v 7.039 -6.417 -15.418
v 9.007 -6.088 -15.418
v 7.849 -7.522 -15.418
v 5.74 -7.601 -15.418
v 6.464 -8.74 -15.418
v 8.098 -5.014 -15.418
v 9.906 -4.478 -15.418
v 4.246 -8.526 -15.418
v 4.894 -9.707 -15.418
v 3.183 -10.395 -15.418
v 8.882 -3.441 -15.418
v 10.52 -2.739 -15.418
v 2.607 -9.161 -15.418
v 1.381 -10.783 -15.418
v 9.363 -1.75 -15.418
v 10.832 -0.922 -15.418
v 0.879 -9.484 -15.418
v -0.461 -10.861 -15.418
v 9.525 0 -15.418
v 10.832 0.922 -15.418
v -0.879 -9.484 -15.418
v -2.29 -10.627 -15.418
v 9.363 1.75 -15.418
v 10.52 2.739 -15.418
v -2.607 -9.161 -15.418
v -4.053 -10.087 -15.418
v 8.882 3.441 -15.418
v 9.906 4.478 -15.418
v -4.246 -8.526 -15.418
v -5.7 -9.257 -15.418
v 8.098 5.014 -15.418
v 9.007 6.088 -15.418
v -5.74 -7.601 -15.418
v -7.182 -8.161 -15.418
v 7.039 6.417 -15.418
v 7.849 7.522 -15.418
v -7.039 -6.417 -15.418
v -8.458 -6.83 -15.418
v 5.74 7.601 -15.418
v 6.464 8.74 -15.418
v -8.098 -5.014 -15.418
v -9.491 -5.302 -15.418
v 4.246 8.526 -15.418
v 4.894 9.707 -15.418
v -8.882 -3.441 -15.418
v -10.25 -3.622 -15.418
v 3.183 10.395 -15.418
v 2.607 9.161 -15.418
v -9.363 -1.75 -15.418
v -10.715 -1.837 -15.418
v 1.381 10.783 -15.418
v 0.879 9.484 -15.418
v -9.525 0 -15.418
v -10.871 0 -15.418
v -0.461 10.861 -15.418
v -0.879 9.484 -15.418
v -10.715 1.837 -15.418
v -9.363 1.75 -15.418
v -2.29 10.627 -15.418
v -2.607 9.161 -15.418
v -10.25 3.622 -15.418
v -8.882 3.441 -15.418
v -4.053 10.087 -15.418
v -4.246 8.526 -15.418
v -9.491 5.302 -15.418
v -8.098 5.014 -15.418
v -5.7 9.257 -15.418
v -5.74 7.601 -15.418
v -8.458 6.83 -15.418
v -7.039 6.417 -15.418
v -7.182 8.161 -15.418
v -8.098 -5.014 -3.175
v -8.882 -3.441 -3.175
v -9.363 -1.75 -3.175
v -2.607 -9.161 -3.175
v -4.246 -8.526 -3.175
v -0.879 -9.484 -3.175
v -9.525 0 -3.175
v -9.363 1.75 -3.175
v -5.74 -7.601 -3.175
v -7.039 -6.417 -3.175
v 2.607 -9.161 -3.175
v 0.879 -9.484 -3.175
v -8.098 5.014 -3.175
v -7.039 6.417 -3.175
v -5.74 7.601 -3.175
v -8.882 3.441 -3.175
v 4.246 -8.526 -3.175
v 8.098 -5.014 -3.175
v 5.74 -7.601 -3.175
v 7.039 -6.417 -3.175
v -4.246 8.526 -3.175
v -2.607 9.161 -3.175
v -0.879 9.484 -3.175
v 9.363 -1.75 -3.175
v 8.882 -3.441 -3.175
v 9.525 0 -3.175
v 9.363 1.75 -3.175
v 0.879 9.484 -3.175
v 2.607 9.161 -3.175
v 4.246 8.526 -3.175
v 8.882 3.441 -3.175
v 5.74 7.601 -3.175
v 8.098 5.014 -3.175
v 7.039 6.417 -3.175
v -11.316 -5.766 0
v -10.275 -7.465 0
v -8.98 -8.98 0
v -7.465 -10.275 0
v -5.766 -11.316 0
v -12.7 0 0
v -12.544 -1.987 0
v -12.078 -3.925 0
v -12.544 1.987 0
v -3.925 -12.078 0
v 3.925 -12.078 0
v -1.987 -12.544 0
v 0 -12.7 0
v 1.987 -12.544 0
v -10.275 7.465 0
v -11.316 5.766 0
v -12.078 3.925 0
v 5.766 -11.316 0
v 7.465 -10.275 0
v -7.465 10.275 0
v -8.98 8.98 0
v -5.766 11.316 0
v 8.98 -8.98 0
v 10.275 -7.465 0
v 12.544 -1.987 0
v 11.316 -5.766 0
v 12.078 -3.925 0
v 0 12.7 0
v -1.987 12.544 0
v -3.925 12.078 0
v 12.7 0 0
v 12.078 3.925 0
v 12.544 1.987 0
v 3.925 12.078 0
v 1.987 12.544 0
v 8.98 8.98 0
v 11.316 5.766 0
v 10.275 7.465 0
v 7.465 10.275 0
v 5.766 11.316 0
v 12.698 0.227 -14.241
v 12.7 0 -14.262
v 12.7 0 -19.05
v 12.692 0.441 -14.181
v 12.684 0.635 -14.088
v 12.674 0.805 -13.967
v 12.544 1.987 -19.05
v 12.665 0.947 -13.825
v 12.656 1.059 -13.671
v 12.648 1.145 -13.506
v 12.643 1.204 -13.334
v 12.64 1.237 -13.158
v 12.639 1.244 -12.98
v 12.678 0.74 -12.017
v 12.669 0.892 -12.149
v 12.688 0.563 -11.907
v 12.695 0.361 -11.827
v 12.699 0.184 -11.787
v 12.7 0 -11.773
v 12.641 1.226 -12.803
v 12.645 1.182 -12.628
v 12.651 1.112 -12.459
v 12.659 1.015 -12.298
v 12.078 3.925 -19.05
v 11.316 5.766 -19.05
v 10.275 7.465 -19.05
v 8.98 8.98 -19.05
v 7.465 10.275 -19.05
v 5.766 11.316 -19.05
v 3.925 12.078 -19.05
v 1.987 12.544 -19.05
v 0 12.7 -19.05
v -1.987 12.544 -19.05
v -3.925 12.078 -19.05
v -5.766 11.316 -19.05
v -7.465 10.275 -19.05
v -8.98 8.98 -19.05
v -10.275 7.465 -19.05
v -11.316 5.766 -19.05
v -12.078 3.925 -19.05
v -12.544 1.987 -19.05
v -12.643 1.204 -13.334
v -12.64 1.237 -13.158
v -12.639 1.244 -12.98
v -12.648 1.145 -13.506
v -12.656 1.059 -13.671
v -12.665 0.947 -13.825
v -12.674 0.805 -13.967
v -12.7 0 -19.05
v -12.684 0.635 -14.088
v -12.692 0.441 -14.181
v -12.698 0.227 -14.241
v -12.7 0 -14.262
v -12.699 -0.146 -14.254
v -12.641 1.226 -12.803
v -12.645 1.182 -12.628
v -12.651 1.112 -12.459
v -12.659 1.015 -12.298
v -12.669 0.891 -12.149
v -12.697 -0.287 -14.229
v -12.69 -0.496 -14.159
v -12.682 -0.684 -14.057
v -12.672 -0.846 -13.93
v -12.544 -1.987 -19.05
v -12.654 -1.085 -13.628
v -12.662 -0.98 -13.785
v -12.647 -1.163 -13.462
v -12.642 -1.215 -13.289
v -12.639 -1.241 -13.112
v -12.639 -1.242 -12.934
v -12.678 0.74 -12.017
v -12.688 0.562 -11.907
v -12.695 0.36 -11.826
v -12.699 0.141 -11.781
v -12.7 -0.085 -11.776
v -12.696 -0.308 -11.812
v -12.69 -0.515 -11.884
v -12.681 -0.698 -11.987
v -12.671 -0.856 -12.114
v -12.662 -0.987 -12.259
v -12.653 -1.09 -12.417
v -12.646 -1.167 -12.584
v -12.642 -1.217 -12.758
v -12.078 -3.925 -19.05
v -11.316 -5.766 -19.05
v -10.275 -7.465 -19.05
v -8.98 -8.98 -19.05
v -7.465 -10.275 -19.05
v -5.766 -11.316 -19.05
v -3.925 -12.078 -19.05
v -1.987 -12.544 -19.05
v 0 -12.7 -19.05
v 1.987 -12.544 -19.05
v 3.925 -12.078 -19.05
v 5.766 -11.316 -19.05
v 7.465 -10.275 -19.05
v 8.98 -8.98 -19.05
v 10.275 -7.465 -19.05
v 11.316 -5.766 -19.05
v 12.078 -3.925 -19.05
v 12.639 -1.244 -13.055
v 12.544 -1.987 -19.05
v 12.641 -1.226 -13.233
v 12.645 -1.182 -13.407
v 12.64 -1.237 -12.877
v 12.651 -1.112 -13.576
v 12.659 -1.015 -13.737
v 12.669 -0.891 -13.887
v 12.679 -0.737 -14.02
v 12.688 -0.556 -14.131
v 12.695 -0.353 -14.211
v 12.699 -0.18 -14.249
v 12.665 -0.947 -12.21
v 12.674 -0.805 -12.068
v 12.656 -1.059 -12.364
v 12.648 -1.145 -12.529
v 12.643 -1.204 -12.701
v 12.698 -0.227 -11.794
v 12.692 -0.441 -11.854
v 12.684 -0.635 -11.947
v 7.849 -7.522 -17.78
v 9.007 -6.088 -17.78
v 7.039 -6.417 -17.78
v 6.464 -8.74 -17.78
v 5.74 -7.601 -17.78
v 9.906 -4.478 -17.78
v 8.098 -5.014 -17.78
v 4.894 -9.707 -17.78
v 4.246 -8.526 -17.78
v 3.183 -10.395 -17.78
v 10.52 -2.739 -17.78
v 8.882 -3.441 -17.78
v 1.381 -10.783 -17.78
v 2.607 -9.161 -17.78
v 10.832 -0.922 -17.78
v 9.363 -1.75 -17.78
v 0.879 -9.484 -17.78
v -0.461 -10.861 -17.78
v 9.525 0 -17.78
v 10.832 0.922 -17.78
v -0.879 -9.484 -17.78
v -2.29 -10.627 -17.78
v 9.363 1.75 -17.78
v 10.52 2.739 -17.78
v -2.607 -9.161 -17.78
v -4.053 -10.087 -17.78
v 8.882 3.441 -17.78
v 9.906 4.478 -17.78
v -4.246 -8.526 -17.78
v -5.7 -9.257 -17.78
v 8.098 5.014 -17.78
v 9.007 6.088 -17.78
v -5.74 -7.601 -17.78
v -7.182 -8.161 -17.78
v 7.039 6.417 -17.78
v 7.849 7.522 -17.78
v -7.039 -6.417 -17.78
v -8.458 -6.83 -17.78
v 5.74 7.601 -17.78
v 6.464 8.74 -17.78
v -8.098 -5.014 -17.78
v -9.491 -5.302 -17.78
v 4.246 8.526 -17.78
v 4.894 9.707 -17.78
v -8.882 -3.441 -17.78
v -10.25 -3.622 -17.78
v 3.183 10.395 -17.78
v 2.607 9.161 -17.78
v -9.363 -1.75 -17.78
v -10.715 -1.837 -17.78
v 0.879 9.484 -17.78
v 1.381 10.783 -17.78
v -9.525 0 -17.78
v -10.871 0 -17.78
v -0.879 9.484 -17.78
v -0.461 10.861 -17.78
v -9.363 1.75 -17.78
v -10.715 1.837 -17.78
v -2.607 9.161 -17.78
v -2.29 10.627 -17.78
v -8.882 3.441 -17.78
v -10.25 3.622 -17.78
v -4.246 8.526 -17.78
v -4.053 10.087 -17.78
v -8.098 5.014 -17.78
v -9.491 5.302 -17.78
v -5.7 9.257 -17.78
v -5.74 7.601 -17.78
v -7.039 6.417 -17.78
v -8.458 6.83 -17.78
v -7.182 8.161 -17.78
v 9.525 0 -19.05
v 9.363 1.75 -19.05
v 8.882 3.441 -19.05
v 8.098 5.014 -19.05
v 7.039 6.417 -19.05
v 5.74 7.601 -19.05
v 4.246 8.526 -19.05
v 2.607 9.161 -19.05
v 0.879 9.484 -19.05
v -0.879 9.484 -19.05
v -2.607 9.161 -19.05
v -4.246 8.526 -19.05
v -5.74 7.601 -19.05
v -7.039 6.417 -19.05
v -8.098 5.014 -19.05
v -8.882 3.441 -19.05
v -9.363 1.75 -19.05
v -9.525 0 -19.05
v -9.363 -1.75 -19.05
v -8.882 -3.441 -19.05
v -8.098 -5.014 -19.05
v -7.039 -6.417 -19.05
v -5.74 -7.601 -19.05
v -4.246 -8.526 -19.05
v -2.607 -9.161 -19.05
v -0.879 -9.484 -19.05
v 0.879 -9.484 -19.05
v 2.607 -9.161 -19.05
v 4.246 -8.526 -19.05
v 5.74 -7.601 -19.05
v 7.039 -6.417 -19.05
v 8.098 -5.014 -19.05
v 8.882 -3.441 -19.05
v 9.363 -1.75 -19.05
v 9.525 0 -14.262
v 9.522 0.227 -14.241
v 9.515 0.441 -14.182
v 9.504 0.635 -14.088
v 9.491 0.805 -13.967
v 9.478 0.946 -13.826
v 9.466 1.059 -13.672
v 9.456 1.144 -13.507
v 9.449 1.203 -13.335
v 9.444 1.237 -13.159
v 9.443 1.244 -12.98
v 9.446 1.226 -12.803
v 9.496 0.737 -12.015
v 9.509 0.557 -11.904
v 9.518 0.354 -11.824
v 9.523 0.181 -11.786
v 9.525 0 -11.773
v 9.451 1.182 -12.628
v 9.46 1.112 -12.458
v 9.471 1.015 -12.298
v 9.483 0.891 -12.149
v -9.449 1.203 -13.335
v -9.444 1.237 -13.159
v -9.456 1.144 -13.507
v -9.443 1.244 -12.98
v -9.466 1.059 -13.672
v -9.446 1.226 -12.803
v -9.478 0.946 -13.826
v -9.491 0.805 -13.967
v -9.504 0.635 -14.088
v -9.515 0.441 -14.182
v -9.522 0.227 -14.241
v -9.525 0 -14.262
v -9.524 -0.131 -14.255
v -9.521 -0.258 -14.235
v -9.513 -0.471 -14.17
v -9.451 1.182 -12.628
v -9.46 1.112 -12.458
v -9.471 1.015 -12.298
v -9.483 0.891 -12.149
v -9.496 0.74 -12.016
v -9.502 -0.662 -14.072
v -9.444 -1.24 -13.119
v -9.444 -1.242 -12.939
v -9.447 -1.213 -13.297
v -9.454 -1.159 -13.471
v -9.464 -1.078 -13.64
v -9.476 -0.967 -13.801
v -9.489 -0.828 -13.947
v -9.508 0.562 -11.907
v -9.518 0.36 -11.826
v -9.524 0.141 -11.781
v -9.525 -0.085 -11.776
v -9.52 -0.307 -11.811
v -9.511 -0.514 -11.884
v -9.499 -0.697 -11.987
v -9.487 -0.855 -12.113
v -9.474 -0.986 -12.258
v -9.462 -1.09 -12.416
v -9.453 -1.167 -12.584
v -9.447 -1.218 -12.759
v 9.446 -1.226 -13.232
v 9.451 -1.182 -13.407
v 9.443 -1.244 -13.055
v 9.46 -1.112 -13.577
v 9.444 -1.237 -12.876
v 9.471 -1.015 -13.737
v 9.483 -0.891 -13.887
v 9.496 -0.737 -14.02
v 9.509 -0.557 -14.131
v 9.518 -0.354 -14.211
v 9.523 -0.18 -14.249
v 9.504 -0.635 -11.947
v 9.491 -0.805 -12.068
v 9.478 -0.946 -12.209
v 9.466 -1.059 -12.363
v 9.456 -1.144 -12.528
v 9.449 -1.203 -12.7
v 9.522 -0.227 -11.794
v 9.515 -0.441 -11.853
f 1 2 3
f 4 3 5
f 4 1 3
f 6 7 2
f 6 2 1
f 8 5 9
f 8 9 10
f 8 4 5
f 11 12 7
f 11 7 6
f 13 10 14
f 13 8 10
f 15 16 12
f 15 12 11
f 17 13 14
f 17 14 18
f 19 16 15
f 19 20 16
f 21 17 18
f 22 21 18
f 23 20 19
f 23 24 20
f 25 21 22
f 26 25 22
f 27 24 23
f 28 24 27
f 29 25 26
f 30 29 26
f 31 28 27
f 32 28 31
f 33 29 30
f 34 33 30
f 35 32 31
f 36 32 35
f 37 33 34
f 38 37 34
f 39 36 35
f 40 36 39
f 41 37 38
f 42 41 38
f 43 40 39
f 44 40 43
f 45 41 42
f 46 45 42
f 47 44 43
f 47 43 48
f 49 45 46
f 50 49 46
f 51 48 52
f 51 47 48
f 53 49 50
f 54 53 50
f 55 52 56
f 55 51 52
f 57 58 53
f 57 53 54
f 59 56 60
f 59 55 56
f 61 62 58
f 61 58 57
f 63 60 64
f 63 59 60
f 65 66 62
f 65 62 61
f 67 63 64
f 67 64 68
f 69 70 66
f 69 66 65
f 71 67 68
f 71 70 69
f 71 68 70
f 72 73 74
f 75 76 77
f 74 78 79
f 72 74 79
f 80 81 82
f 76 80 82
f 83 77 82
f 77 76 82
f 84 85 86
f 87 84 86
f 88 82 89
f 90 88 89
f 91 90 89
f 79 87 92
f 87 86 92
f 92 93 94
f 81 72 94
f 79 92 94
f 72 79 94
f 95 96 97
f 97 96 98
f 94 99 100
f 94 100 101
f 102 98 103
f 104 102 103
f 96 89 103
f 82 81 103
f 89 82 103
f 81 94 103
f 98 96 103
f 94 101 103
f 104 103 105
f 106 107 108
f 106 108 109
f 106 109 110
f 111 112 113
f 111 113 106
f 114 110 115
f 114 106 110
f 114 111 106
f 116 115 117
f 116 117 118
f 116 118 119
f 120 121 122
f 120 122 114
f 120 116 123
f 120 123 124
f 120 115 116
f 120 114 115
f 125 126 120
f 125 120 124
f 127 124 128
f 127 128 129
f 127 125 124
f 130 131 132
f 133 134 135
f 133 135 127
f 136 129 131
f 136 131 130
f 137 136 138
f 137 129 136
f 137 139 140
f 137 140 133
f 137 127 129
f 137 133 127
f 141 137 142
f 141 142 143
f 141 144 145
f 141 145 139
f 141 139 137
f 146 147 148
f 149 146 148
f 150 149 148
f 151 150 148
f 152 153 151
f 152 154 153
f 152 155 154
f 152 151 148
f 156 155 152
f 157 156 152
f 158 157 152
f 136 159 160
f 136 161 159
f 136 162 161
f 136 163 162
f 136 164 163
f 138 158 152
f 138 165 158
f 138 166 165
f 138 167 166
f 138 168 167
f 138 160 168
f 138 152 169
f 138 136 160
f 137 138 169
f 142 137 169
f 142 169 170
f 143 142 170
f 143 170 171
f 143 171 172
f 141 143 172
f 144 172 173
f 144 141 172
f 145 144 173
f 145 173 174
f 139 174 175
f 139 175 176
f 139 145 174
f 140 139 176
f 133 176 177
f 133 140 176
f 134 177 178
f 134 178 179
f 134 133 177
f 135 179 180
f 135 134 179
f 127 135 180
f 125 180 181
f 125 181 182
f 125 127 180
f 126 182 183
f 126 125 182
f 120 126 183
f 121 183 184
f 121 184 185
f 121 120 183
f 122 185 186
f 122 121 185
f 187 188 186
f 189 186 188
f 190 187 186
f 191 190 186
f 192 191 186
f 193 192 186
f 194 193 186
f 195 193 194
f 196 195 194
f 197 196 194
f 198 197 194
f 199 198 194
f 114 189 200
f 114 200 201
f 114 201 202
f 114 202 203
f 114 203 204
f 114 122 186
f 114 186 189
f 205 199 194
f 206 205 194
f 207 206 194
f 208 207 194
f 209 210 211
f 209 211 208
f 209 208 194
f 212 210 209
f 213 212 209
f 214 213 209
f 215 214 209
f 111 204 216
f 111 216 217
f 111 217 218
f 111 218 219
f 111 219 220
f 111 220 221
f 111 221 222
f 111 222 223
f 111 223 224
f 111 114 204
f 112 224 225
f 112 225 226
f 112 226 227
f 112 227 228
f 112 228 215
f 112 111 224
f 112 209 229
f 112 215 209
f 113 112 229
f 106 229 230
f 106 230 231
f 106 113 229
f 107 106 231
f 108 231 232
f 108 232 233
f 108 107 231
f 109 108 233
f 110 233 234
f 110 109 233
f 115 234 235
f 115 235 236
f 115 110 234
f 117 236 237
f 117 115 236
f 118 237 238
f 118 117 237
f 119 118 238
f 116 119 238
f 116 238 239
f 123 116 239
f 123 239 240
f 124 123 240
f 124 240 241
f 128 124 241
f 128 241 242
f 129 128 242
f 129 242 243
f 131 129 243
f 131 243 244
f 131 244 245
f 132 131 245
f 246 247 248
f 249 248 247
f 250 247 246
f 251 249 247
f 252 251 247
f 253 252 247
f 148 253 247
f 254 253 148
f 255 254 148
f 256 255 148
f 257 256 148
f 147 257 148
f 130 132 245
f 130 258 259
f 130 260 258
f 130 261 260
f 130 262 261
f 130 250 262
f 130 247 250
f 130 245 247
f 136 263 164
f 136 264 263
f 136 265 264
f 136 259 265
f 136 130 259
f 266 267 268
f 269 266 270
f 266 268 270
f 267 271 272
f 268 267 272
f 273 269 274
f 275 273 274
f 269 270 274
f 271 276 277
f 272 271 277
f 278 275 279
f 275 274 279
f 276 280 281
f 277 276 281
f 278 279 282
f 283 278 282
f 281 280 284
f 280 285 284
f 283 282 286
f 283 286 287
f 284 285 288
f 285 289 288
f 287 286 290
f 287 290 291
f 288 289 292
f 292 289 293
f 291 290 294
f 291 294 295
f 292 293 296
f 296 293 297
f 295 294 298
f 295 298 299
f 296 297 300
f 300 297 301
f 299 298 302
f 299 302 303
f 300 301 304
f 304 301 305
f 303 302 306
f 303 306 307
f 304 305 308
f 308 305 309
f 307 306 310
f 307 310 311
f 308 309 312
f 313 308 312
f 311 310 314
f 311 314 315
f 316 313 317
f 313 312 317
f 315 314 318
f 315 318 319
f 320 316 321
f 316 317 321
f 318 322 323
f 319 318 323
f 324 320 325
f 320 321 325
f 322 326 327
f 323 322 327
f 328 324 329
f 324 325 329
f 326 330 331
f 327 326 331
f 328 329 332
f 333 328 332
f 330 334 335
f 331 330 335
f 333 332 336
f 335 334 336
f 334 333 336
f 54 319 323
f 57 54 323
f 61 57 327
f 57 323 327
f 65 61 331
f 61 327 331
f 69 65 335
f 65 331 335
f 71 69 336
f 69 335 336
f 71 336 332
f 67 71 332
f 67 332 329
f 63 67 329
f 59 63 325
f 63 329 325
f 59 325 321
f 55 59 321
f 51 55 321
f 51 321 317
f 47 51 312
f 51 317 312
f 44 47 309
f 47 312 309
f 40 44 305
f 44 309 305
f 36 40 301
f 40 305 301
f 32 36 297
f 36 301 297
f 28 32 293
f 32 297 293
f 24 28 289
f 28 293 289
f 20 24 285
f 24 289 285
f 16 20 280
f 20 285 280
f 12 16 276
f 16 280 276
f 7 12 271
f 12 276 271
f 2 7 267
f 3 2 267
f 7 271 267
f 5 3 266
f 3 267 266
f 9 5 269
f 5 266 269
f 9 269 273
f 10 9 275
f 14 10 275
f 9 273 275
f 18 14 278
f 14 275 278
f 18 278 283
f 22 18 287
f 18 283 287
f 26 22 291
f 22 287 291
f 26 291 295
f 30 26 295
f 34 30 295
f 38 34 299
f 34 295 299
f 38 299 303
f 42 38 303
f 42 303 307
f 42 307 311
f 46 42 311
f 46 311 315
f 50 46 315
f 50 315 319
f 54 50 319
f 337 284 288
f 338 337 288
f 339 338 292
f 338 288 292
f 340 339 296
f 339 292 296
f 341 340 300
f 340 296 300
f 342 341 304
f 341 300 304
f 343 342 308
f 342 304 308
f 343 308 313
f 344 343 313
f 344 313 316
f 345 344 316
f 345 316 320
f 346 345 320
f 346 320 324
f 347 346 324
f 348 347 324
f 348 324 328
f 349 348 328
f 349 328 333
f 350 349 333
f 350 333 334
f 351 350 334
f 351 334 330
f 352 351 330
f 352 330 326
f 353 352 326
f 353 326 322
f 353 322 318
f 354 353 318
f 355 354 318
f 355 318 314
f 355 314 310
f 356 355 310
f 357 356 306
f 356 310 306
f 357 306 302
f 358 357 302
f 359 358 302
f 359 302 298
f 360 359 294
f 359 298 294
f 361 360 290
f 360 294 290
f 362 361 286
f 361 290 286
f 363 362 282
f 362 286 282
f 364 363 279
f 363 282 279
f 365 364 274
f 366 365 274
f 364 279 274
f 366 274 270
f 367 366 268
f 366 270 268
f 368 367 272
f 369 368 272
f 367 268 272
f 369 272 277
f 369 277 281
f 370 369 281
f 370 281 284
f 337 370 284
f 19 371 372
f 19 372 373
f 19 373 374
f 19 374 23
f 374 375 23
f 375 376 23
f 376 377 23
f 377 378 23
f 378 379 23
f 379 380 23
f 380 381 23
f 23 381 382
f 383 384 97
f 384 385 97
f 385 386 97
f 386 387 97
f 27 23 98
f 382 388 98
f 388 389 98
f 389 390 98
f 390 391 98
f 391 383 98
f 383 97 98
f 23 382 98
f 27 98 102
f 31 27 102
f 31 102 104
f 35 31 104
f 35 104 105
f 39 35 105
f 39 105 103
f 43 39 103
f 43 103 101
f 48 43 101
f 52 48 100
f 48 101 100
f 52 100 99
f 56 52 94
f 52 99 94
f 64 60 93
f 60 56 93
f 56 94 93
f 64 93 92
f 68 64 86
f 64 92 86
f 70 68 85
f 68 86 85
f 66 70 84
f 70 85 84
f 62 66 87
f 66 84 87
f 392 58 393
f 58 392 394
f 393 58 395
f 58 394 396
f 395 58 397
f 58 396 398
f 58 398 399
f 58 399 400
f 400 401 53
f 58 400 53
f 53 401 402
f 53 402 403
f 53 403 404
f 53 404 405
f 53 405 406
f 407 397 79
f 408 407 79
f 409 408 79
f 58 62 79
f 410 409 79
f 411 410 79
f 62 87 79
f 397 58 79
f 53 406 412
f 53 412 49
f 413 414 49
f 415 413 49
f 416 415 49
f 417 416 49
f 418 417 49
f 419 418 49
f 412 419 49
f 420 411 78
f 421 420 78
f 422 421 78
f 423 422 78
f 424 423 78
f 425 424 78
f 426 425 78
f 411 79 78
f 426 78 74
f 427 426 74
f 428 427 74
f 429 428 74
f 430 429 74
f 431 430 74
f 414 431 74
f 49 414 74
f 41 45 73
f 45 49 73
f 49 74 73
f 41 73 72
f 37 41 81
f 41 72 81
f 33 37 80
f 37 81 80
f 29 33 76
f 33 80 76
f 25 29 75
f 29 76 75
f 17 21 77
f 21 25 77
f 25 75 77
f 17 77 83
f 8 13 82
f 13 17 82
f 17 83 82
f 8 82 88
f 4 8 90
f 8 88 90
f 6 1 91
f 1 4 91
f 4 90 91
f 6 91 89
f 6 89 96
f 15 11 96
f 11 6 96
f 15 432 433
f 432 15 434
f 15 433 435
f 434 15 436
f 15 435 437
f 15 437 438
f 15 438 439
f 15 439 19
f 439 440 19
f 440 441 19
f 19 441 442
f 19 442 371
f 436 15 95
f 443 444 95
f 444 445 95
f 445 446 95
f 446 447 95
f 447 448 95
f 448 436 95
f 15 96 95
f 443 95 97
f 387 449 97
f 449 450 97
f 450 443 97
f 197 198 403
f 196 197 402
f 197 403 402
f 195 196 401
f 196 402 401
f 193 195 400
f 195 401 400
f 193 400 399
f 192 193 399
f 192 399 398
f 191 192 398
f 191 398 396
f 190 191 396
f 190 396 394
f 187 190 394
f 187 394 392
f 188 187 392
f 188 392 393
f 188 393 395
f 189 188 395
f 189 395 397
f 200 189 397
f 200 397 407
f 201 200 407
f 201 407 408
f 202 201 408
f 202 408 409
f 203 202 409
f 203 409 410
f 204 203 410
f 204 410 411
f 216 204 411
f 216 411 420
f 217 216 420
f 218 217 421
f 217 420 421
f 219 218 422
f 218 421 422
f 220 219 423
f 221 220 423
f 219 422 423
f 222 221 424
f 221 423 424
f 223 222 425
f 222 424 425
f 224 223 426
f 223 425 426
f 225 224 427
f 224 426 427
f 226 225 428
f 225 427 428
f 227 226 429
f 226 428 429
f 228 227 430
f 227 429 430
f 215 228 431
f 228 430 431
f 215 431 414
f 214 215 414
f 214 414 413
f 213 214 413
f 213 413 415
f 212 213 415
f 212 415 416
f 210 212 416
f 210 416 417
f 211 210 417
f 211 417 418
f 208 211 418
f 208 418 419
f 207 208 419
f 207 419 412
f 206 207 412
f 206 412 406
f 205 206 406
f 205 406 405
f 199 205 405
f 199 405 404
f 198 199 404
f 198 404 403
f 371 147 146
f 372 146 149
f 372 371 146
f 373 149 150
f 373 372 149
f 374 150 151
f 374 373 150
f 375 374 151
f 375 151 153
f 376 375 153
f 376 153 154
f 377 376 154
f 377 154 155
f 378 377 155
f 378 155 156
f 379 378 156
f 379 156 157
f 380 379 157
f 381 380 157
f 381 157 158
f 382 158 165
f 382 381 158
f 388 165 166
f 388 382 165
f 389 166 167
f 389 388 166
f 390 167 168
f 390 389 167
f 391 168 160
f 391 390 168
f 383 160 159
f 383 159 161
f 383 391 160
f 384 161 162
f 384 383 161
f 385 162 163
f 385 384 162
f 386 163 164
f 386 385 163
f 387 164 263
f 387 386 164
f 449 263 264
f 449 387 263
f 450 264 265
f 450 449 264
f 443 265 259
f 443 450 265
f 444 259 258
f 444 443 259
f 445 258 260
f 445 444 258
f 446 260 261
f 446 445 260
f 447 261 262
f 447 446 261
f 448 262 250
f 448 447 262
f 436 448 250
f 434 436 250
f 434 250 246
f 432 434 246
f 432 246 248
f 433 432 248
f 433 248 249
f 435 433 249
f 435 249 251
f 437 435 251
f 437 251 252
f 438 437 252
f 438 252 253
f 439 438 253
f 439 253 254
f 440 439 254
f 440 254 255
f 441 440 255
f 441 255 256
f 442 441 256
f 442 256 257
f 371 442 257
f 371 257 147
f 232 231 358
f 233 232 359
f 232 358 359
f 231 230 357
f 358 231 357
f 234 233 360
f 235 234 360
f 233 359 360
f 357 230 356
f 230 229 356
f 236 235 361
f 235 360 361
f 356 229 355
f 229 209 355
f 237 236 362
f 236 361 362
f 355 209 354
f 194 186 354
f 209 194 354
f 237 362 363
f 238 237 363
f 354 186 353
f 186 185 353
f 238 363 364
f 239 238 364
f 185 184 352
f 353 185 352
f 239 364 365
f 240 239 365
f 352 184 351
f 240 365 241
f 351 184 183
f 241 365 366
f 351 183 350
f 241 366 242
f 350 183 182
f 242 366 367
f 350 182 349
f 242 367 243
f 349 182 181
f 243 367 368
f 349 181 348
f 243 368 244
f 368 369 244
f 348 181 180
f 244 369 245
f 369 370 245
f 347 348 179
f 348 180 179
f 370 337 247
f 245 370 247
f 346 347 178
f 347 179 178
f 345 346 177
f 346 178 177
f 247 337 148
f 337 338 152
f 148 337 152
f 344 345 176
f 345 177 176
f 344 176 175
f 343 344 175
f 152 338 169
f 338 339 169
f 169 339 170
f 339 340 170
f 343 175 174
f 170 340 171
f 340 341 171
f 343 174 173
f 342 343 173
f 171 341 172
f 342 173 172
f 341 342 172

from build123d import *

# Parameters (mm, degrees)
SKETCH1_R               = 12.7
BOSS_EXTRUDE1_DEPTH     = 19.05
SHELL1_T                = -3.175
SKETCH4_R               = 1.2446
CUT_EXTRUDE1_DEPTH      = 27.181720723
CUT_EXTRUDE1_DEPTH_BACK = 27.181720723
SKETCH7_R               = 10.8712
SKETCH7_R_2             = 9.525
CUT_EXTRUDE2_DEPTH      = 2.3622


with BuildPart() as part:
    # Sketch1 → Boss-Extrude1 (new body)
    with BuildSketch(Plane.XY):
        Circle(SKETCH1_R)
    extrude(amount=-BOSS_EXTRUDE1_DEPTH)

    # Shell1
    shell1_openings = [part.faces().sort_by_distance(p)[0] for p in [
        (0, 0, -19.05),
    ]]
    offset(amount=SHELL1_T, openings=shell1_openings, kind=Kind.INTERSECTION)

    # Sketch4 → Cut-Extrude1 (cut, two sides)
    with BuildSketch(Plane(origin=(0, 0, 0), x_dir=(0, 0, -1), z_dir=(1, 0, 0))) as cut_extrude1_sk:
        with Locations((13.0175, 0)):
            Circle(SKETCH4_R)
    extrude(amount=CUT_EXTRUDE1_DEPTH, mode=Mode.SUBTRACT)
    extrude(cut_extrude1_sk.sketch, amount=-CUT_EXTRUDE1_DEPTH_BACK, mode=Mode.SUBTRACT)

    # Sketch7 → Cut-Extrude2 (cut)
    with BuildSketch(Plane(origin=(0, 0, -17.78), x_dir=(-1, 0, 0), z_dir=(0, 0, -1))):
        Circle(SKETCH7_R)
        with Locations(Location((0, 0, 0), (0, 0, 180))):
            Circle(SKETCH7_R_2, mode=Mode.SUBTRACT)
    extrude(amount=-CUT_EXTRUDE2_DEPTH, mode=Mode.SUBTRACT)


solid = part.part
